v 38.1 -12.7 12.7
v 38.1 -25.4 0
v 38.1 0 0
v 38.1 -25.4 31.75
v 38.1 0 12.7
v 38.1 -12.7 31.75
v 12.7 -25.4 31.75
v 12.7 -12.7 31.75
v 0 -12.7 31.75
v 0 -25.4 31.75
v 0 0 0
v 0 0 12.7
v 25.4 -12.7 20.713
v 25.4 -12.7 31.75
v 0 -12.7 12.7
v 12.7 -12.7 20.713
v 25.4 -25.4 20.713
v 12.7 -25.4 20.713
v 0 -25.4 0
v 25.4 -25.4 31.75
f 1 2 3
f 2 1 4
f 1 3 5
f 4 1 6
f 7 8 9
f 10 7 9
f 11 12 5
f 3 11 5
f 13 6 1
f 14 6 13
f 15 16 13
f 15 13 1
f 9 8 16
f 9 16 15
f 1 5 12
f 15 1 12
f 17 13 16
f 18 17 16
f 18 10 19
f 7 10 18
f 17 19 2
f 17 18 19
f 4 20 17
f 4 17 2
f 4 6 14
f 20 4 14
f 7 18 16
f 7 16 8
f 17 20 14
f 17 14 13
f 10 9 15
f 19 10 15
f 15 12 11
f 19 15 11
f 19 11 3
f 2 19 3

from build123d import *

# Parameters (mm, degrees)
F1_DEPTH = 25.4
F3_DEPTH = 12.7


with BuildPart() as f1:
    # F0 (on Front) → F1 (new body)
    with BuildSketch(Plane.XZ):
        Polygon((0, 31.75), (0, 0), (38.1, 0), (38.1, 31.75), (25.4, 31.75), (25.4, 20.713098), (12.7, 20.713098), (12.7, 31.75), align=None)
    extrude(amount=F1_DEPTH)

    # F2 (on face) → F3 (cut)
    with BuildSketch(Plane(origin=(0, 0, 0), x_dir=(-1, 0, 0), z_dir=(0, 1, 0))):
        Polygon((-38.1, 31.75), (-38.1, 12.7), (0, 12.7), (0, 31.75), (-12.7, 31.75), (-12.7, 20.713098), (-25.4, 20.713098), (-25.4, 31.75), align=None)
    extrude(amount=-F3_DEPTH, mode=Mode.SUBTRACT)


solid = f1.part
